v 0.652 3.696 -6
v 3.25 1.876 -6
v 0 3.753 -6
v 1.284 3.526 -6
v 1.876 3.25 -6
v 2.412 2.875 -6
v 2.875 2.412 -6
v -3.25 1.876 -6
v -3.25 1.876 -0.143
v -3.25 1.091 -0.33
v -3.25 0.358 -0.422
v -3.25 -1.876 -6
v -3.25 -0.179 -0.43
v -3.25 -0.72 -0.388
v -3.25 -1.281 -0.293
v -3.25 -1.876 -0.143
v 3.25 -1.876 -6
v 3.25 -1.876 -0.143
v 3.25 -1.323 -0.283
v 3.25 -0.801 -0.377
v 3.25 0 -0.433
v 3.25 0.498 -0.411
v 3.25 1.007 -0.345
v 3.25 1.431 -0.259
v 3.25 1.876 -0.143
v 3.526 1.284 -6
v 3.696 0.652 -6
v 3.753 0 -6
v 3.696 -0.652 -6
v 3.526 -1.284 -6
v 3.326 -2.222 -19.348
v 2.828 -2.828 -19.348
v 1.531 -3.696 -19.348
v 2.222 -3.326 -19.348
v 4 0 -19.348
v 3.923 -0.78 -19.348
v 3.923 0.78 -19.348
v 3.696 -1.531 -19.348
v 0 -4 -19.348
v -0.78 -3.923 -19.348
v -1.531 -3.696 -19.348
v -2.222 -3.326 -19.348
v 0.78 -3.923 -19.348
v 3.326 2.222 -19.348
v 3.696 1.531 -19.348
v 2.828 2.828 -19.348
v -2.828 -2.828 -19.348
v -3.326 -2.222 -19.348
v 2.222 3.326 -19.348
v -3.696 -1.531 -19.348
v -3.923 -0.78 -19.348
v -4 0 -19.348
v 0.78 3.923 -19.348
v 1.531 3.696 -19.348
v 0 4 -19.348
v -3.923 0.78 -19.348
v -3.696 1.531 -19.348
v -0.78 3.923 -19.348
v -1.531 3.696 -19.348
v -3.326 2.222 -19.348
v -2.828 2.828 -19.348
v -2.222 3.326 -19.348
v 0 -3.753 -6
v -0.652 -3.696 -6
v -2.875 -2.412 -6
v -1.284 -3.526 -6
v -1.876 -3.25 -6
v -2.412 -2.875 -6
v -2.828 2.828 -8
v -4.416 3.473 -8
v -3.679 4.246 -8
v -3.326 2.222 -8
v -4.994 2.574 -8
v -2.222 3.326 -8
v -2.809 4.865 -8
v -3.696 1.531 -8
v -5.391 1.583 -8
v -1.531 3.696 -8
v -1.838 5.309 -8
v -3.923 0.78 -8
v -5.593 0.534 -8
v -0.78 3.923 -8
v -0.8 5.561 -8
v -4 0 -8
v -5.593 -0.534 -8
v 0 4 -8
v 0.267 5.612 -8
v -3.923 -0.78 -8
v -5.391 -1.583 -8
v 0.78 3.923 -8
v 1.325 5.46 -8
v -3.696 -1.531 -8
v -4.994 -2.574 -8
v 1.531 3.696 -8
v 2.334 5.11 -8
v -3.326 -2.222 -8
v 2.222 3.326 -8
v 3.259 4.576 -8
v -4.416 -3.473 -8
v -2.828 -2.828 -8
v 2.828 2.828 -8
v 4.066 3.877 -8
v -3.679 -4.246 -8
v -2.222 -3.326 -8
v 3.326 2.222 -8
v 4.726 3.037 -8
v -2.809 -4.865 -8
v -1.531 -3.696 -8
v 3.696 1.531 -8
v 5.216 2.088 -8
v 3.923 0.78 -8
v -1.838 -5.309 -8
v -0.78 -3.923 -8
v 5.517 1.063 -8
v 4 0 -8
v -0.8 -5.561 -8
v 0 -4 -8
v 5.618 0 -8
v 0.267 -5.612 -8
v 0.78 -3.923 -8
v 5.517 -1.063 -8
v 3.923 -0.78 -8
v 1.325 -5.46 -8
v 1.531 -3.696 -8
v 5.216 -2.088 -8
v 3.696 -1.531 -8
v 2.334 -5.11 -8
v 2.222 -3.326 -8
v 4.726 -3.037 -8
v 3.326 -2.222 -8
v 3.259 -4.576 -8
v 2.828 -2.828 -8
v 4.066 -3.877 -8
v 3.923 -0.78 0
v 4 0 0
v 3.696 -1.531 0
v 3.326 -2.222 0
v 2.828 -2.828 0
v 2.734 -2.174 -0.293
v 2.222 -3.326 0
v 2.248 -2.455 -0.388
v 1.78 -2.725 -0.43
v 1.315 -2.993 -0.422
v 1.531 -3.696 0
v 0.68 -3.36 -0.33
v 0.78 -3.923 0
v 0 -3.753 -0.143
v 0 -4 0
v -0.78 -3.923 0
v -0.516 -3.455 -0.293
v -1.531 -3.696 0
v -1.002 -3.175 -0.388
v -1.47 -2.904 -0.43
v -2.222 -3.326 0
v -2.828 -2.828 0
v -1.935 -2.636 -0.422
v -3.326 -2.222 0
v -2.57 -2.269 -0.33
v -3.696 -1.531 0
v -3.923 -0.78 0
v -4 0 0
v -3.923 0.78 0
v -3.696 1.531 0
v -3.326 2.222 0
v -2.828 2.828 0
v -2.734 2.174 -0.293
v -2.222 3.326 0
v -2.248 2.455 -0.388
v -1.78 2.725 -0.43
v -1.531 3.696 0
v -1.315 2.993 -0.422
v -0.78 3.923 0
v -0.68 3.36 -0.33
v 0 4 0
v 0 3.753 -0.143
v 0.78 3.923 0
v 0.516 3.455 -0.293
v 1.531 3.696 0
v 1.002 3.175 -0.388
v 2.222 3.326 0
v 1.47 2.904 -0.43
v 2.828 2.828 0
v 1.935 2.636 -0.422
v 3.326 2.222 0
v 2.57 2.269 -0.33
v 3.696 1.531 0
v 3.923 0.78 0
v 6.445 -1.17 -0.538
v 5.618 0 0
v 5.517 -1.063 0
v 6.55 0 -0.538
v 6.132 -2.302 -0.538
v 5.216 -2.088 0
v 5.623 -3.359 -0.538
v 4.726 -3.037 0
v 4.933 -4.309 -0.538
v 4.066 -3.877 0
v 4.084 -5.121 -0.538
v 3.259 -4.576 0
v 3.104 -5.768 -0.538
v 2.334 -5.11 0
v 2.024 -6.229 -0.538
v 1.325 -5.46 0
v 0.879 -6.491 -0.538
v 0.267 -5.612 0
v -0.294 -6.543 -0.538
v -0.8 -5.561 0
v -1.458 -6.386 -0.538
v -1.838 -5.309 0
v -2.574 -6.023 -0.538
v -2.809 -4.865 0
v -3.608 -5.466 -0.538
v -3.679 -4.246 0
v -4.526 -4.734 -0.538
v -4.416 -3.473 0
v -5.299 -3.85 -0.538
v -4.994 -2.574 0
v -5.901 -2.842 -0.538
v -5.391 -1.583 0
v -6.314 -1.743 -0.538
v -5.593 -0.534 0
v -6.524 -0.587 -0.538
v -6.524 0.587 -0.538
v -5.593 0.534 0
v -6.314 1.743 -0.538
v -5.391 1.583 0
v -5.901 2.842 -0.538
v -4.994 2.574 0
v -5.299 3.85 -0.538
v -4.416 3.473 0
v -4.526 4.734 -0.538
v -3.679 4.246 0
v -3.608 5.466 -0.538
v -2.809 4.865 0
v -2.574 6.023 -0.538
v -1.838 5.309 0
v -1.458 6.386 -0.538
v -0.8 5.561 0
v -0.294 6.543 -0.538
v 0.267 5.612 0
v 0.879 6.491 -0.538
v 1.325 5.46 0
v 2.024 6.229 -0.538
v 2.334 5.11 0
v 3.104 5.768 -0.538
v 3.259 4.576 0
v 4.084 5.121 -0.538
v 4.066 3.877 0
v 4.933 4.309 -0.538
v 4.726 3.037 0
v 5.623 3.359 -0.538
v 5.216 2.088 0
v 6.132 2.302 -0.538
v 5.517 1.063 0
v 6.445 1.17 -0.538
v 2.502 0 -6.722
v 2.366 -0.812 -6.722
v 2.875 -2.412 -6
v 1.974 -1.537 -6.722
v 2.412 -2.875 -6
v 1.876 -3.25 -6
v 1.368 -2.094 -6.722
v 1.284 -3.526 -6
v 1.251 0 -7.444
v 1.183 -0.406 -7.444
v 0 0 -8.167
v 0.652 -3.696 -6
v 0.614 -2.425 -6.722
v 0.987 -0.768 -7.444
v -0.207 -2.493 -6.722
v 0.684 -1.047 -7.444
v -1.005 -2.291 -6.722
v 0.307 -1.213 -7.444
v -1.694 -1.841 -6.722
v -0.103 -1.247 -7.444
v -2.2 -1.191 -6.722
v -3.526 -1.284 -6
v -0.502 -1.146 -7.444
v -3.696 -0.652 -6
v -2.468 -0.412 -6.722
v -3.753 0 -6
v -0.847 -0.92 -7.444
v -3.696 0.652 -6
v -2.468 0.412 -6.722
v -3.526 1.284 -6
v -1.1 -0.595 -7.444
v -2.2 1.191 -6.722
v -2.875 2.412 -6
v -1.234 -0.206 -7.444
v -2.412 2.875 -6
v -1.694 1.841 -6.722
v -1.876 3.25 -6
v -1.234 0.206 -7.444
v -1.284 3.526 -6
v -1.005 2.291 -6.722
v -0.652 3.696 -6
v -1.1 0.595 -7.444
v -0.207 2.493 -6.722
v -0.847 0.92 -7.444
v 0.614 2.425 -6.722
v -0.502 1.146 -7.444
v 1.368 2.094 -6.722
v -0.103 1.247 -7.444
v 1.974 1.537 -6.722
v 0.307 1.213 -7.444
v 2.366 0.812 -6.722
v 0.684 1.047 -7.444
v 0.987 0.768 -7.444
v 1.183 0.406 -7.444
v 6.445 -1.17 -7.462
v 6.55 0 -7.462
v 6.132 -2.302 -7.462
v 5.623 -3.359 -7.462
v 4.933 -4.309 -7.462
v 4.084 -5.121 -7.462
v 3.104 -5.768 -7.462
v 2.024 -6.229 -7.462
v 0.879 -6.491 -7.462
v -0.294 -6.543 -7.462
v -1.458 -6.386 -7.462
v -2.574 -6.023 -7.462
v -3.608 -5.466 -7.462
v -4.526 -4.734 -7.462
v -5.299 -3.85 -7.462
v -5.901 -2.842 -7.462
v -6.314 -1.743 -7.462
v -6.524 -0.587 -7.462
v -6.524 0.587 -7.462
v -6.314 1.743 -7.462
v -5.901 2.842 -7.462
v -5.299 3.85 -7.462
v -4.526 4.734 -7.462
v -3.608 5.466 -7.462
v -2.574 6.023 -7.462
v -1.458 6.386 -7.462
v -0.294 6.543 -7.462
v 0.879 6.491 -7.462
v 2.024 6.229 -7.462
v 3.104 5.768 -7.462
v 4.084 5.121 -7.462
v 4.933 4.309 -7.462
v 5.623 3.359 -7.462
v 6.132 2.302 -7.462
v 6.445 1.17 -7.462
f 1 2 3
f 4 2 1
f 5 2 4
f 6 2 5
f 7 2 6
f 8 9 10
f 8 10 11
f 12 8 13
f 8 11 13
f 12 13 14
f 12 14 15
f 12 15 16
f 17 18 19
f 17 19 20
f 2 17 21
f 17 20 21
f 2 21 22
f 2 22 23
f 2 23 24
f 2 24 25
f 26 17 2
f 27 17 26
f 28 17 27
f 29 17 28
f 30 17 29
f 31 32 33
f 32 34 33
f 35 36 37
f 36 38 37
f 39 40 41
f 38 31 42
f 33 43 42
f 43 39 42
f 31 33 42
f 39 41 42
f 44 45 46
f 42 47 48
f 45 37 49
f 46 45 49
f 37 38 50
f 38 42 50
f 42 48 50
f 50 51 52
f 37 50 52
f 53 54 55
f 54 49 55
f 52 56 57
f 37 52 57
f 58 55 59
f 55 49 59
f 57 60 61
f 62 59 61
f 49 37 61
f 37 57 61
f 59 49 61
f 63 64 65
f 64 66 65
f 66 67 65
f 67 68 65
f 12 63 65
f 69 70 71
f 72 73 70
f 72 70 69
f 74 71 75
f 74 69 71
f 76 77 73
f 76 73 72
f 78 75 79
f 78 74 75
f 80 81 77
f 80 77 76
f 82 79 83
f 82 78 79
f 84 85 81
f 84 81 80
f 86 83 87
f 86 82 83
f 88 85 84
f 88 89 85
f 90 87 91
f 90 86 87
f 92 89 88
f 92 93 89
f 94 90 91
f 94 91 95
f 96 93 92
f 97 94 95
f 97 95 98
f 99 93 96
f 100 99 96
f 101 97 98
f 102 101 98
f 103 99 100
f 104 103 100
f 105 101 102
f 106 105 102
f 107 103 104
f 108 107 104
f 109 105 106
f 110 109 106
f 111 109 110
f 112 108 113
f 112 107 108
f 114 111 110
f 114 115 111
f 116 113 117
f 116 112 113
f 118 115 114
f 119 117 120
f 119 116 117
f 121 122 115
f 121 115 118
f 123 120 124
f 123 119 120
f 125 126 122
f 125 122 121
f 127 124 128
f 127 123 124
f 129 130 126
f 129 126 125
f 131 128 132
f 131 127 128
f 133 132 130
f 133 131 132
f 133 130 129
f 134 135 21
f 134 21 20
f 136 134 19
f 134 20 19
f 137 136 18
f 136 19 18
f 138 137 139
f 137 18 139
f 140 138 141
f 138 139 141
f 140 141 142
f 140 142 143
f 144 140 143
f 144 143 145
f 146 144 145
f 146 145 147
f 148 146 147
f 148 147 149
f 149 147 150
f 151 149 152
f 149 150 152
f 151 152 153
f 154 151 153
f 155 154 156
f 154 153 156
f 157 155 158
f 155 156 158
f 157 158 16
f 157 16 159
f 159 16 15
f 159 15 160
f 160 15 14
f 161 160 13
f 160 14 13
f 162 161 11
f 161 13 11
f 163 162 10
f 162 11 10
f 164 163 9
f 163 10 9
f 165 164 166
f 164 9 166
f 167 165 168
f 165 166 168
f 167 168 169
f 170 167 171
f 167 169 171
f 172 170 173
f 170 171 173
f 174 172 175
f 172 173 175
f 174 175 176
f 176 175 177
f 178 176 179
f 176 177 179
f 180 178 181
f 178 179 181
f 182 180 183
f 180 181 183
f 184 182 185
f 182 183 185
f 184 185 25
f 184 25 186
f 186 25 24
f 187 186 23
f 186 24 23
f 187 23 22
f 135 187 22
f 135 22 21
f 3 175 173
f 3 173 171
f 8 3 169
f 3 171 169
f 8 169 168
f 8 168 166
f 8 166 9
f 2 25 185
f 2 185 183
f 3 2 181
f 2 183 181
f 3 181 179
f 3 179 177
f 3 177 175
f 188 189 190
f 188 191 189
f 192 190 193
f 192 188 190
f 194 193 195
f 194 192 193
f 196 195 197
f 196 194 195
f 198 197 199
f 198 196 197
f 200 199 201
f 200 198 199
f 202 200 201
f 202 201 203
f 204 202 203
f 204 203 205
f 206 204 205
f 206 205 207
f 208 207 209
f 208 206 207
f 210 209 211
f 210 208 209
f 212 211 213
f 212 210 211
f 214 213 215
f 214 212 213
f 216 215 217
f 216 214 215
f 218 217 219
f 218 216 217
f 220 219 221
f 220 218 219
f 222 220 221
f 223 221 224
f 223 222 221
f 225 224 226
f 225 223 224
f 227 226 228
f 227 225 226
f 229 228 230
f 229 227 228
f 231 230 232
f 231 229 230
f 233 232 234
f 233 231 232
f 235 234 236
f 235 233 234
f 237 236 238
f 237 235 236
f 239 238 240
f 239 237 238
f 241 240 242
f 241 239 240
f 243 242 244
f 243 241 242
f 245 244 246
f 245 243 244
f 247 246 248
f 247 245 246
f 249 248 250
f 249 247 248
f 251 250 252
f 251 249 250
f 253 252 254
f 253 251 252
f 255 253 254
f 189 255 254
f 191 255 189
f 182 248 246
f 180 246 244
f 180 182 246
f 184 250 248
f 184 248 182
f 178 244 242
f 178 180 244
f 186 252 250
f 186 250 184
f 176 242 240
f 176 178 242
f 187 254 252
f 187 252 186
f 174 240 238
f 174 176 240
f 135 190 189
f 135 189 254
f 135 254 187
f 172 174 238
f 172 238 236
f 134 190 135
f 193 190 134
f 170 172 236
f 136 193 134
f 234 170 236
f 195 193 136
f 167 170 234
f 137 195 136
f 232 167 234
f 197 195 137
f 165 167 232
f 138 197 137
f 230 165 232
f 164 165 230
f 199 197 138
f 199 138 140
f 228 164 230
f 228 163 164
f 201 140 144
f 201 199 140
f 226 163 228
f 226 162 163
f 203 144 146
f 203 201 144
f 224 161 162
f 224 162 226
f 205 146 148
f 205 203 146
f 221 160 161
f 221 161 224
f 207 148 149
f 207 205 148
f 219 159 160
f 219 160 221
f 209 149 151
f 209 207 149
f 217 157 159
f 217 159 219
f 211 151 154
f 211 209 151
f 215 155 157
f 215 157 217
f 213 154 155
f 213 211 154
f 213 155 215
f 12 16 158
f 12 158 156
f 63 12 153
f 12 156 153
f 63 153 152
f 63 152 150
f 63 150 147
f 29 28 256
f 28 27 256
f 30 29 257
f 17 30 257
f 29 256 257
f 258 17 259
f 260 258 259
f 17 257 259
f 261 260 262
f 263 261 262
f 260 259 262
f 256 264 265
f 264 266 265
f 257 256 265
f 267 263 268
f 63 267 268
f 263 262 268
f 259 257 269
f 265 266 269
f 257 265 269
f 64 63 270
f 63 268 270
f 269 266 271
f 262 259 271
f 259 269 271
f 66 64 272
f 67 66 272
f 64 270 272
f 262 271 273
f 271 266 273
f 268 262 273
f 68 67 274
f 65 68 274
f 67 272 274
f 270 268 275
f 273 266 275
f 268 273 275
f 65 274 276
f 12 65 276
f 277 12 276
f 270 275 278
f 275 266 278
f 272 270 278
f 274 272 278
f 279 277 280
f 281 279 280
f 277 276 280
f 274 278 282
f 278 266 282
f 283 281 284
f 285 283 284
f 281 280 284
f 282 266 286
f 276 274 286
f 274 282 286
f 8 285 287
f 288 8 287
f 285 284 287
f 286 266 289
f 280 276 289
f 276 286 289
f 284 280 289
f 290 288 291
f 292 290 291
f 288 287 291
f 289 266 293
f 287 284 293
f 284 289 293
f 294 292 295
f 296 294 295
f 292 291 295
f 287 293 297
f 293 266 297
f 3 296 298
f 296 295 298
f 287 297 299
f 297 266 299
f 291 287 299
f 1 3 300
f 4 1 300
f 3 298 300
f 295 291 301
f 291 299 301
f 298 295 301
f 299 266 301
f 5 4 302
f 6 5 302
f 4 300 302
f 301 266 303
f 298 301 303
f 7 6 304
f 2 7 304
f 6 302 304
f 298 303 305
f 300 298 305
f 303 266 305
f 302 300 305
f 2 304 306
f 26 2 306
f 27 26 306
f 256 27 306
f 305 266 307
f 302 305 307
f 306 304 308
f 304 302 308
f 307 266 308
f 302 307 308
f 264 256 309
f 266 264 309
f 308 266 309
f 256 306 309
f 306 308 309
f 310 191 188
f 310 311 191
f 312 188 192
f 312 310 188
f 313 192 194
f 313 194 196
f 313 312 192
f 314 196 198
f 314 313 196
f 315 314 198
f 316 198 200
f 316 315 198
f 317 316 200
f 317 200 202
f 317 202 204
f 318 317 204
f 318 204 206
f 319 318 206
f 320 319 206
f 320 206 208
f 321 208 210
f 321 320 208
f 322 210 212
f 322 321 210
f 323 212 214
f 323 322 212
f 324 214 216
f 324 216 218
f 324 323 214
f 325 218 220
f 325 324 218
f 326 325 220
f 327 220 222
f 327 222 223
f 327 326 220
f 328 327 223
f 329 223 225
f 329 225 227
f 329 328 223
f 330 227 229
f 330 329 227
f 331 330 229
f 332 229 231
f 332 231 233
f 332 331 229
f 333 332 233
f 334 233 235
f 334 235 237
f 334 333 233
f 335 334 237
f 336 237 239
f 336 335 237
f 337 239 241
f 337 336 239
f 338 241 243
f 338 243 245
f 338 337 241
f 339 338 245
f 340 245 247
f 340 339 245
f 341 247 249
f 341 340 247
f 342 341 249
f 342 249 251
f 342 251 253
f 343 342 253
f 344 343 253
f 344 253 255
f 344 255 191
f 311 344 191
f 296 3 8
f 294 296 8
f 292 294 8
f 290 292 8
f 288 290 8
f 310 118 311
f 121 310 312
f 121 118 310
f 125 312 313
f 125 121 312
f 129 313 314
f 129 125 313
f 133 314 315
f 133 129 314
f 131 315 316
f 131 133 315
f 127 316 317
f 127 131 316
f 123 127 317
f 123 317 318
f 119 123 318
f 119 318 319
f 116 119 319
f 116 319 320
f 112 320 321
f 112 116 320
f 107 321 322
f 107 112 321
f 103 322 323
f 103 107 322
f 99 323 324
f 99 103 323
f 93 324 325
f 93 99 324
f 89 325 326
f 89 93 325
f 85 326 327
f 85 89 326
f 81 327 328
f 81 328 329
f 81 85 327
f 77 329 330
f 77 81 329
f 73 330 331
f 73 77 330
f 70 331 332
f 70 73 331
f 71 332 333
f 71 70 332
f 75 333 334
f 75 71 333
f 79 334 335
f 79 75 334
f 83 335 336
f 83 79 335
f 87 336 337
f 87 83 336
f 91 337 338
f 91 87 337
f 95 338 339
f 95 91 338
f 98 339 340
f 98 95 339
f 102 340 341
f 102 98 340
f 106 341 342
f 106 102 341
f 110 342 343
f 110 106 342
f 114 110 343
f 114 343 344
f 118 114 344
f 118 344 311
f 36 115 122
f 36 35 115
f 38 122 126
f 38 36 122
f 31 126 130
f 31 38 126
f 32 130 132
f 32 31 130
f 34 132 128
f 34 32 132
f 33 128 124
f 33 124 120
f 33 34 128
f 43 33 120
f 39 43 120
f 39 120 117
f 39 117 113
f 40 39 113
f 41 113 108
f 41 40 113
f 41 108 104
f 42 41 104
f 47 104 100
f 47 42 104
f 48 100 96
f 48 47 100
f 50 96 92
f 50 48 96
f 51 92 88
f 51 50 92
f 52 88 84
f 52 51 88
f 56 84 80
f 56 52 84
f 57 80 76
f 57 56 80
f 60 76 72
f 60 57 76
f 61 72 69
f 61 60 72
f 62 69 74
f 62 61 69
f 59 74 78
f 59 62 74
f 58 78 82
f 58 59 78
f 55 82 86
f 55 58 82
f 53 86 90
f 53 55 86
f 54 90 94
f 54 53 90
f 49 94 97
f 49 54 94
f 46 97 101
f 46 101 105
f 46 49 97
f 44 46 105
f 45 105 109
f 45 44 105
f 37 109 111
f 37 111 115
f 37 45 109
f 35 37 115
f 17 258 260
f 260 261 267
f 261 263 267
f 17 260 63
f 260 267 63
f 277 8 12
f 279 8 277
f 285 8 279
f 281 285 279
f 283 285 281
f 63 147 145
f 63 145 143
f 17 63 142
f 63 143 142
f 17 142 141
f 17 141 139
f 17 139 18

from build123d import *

# Parameters (mm, degrees)
CHAMFER1_SIZE           = 0.8
CUT_EXTRUDE1_DEPTH      = 6
CUT_EXTRUDE2_DEPTH      = 21
CUT_EXTRUDE2_DEPTH_BACK = 18
SKETCH17_W              = 9.291812213
SKETCH17_H              = 14.847741165
CUT_EXTRUDE3_DEPTH      = 18
CUT_EXTRUDE3_DEPTH_BACK = 18
SKETCH18_W              = 16.942014586
SKETCH18_H              = 5.743756165
CUT_EXTRUDE4_DEPTH      = 36
CUT_EXTRUDE4_DEPTH_BACK = 60
SKETCH19_W              = 5.251267682
SKETCH19_H              = 11.080799959


with BuildPart() as part:
    # Sketch1 → Revolve1 (revolve)
    with BuildSketch(Plane(origin=(0, 0, 0), x_dir=(0, 0, -1), z_dir=(1, 0, 0)), mode=Mode.PRIVATE) as revolve1_sk:
        Polygon((0, 0), (0, 5.618156666), (0.538, 6.55), (7.462, 6.55), (8, 5.618156666), (8, 4), (38, 4), (38, 0), align=None)
    revolve(revolve1_sk.sketch.rotate(Axis((0, 0, 0), (0, 0, -1)), 90), axis=Axis((0, 0, 0), (0, 0, -1)))

    # Chamfer1
    chamfer1_edges = [part.edges().sort_by_distance(p)[0] for p in [
        (-4, 0, -38),
    ]]
    chamfer(chamfer1_edges, length=CHAMFER1_SIZE)

    # Sketch2 → Cut-Extrude1 (cut)
    with BuildSketch(Plane.XY):
        Polygon((3.25, 1.876388375), (0, 3.75277675), (-3.25, 1.876388375), (-3.25, -1.876388375), (0, -3.75277675), (3.25, -1.876388375), align=None)
    extrude(amount=-CUT_EXTRUDE1_DEPTH, mode=Mode.SUBTRACT)

    # Sketch3 → Cut-Revolve1 (revolve, cut)
    with BuildSketch(Plane(origin=(0, 0, 0), x_dir=(0, 0, -1), z_dir=(1, 0, 0)), mode=Mode.PRIVATE) as cut_revolve1_sk:
        Polygon((0, 0), (0, 4), (2.309401077, 0), align=None)
        Polygon((6, 0), (6, 3.75277675), (8.166666667, 0), align=None)
    revolve(cut_revolve1_sk.sketch.rotate(Axis((0, 0, 1.402800488), (0, 0, -1)), 90), axis=Axis((0, 0, 1.402800488), (0, 0, -1)), mode=Mode.SUBTRACT)

    # Sketch17 → Cut-Extrude2 (cut, two sides: drawn at the far end of the back side and taken through both)
    with BuildSketch(Plane.ZY.offset(-3.25).offset(-CUT_EXTRUDE2_DEPTH_BACK)):
        with Locations((-34.32554678, -0.925988159)):
            Rectangle(SKETCH17_W, SKETCH17_H)
    extrude(amount=CUT_EXTRUDE2_DEPTH + CUT_EXTRUDE2_DEPTH_BACK, mode=Mode.SUBTRACT)

    # Sketch18 → Cut-Extrude3 (cut, two sides: drawn at the far end of the back side and taken through both)
    with BuildSketch(Plane(origin=(1.625, 2.814582562, 0), x_dir=(0.8660254037844387, -0.49999999999999983, 0), z_dir=(-0.49999999999999983, -0.8660254037844387, 0)).offset(-CUT_EXTRUDE3_DEPTH_BACK)):
        with Locations((1.337252905, -27.251034813)):
            Rectangle(SKETCH18_W, SKETCH18_H)
    extrude(amount=CUT_EXTRUDE3_DEPTH + CUT_EXTRUDE3_DEPTH_BACK, mode=Mode.SUBTRACT)

    # Sketch19 → Cut-Extrude4 (cut, two sides: drawn at the far end of the back side and taken through both)
    with BuildSketch(Plane(origin=(0, 0, 0), x_dir=(0, 0, -1), z_dir=(1, 0, 0)).offset(-CUT_EXTRUDE4_DEPTH_BACK)):
        with Locations((21.973190176, -0.187545275)):
            Rectangle(SKETCH19_W, SKETCH19_H)
    extrude(amount=CUT_EXTRUDE4_DEPTH + CUT_EXTRUDE4_DEPTH_BACK, mode=Mode.SUBTRACT)


solid = part.part
